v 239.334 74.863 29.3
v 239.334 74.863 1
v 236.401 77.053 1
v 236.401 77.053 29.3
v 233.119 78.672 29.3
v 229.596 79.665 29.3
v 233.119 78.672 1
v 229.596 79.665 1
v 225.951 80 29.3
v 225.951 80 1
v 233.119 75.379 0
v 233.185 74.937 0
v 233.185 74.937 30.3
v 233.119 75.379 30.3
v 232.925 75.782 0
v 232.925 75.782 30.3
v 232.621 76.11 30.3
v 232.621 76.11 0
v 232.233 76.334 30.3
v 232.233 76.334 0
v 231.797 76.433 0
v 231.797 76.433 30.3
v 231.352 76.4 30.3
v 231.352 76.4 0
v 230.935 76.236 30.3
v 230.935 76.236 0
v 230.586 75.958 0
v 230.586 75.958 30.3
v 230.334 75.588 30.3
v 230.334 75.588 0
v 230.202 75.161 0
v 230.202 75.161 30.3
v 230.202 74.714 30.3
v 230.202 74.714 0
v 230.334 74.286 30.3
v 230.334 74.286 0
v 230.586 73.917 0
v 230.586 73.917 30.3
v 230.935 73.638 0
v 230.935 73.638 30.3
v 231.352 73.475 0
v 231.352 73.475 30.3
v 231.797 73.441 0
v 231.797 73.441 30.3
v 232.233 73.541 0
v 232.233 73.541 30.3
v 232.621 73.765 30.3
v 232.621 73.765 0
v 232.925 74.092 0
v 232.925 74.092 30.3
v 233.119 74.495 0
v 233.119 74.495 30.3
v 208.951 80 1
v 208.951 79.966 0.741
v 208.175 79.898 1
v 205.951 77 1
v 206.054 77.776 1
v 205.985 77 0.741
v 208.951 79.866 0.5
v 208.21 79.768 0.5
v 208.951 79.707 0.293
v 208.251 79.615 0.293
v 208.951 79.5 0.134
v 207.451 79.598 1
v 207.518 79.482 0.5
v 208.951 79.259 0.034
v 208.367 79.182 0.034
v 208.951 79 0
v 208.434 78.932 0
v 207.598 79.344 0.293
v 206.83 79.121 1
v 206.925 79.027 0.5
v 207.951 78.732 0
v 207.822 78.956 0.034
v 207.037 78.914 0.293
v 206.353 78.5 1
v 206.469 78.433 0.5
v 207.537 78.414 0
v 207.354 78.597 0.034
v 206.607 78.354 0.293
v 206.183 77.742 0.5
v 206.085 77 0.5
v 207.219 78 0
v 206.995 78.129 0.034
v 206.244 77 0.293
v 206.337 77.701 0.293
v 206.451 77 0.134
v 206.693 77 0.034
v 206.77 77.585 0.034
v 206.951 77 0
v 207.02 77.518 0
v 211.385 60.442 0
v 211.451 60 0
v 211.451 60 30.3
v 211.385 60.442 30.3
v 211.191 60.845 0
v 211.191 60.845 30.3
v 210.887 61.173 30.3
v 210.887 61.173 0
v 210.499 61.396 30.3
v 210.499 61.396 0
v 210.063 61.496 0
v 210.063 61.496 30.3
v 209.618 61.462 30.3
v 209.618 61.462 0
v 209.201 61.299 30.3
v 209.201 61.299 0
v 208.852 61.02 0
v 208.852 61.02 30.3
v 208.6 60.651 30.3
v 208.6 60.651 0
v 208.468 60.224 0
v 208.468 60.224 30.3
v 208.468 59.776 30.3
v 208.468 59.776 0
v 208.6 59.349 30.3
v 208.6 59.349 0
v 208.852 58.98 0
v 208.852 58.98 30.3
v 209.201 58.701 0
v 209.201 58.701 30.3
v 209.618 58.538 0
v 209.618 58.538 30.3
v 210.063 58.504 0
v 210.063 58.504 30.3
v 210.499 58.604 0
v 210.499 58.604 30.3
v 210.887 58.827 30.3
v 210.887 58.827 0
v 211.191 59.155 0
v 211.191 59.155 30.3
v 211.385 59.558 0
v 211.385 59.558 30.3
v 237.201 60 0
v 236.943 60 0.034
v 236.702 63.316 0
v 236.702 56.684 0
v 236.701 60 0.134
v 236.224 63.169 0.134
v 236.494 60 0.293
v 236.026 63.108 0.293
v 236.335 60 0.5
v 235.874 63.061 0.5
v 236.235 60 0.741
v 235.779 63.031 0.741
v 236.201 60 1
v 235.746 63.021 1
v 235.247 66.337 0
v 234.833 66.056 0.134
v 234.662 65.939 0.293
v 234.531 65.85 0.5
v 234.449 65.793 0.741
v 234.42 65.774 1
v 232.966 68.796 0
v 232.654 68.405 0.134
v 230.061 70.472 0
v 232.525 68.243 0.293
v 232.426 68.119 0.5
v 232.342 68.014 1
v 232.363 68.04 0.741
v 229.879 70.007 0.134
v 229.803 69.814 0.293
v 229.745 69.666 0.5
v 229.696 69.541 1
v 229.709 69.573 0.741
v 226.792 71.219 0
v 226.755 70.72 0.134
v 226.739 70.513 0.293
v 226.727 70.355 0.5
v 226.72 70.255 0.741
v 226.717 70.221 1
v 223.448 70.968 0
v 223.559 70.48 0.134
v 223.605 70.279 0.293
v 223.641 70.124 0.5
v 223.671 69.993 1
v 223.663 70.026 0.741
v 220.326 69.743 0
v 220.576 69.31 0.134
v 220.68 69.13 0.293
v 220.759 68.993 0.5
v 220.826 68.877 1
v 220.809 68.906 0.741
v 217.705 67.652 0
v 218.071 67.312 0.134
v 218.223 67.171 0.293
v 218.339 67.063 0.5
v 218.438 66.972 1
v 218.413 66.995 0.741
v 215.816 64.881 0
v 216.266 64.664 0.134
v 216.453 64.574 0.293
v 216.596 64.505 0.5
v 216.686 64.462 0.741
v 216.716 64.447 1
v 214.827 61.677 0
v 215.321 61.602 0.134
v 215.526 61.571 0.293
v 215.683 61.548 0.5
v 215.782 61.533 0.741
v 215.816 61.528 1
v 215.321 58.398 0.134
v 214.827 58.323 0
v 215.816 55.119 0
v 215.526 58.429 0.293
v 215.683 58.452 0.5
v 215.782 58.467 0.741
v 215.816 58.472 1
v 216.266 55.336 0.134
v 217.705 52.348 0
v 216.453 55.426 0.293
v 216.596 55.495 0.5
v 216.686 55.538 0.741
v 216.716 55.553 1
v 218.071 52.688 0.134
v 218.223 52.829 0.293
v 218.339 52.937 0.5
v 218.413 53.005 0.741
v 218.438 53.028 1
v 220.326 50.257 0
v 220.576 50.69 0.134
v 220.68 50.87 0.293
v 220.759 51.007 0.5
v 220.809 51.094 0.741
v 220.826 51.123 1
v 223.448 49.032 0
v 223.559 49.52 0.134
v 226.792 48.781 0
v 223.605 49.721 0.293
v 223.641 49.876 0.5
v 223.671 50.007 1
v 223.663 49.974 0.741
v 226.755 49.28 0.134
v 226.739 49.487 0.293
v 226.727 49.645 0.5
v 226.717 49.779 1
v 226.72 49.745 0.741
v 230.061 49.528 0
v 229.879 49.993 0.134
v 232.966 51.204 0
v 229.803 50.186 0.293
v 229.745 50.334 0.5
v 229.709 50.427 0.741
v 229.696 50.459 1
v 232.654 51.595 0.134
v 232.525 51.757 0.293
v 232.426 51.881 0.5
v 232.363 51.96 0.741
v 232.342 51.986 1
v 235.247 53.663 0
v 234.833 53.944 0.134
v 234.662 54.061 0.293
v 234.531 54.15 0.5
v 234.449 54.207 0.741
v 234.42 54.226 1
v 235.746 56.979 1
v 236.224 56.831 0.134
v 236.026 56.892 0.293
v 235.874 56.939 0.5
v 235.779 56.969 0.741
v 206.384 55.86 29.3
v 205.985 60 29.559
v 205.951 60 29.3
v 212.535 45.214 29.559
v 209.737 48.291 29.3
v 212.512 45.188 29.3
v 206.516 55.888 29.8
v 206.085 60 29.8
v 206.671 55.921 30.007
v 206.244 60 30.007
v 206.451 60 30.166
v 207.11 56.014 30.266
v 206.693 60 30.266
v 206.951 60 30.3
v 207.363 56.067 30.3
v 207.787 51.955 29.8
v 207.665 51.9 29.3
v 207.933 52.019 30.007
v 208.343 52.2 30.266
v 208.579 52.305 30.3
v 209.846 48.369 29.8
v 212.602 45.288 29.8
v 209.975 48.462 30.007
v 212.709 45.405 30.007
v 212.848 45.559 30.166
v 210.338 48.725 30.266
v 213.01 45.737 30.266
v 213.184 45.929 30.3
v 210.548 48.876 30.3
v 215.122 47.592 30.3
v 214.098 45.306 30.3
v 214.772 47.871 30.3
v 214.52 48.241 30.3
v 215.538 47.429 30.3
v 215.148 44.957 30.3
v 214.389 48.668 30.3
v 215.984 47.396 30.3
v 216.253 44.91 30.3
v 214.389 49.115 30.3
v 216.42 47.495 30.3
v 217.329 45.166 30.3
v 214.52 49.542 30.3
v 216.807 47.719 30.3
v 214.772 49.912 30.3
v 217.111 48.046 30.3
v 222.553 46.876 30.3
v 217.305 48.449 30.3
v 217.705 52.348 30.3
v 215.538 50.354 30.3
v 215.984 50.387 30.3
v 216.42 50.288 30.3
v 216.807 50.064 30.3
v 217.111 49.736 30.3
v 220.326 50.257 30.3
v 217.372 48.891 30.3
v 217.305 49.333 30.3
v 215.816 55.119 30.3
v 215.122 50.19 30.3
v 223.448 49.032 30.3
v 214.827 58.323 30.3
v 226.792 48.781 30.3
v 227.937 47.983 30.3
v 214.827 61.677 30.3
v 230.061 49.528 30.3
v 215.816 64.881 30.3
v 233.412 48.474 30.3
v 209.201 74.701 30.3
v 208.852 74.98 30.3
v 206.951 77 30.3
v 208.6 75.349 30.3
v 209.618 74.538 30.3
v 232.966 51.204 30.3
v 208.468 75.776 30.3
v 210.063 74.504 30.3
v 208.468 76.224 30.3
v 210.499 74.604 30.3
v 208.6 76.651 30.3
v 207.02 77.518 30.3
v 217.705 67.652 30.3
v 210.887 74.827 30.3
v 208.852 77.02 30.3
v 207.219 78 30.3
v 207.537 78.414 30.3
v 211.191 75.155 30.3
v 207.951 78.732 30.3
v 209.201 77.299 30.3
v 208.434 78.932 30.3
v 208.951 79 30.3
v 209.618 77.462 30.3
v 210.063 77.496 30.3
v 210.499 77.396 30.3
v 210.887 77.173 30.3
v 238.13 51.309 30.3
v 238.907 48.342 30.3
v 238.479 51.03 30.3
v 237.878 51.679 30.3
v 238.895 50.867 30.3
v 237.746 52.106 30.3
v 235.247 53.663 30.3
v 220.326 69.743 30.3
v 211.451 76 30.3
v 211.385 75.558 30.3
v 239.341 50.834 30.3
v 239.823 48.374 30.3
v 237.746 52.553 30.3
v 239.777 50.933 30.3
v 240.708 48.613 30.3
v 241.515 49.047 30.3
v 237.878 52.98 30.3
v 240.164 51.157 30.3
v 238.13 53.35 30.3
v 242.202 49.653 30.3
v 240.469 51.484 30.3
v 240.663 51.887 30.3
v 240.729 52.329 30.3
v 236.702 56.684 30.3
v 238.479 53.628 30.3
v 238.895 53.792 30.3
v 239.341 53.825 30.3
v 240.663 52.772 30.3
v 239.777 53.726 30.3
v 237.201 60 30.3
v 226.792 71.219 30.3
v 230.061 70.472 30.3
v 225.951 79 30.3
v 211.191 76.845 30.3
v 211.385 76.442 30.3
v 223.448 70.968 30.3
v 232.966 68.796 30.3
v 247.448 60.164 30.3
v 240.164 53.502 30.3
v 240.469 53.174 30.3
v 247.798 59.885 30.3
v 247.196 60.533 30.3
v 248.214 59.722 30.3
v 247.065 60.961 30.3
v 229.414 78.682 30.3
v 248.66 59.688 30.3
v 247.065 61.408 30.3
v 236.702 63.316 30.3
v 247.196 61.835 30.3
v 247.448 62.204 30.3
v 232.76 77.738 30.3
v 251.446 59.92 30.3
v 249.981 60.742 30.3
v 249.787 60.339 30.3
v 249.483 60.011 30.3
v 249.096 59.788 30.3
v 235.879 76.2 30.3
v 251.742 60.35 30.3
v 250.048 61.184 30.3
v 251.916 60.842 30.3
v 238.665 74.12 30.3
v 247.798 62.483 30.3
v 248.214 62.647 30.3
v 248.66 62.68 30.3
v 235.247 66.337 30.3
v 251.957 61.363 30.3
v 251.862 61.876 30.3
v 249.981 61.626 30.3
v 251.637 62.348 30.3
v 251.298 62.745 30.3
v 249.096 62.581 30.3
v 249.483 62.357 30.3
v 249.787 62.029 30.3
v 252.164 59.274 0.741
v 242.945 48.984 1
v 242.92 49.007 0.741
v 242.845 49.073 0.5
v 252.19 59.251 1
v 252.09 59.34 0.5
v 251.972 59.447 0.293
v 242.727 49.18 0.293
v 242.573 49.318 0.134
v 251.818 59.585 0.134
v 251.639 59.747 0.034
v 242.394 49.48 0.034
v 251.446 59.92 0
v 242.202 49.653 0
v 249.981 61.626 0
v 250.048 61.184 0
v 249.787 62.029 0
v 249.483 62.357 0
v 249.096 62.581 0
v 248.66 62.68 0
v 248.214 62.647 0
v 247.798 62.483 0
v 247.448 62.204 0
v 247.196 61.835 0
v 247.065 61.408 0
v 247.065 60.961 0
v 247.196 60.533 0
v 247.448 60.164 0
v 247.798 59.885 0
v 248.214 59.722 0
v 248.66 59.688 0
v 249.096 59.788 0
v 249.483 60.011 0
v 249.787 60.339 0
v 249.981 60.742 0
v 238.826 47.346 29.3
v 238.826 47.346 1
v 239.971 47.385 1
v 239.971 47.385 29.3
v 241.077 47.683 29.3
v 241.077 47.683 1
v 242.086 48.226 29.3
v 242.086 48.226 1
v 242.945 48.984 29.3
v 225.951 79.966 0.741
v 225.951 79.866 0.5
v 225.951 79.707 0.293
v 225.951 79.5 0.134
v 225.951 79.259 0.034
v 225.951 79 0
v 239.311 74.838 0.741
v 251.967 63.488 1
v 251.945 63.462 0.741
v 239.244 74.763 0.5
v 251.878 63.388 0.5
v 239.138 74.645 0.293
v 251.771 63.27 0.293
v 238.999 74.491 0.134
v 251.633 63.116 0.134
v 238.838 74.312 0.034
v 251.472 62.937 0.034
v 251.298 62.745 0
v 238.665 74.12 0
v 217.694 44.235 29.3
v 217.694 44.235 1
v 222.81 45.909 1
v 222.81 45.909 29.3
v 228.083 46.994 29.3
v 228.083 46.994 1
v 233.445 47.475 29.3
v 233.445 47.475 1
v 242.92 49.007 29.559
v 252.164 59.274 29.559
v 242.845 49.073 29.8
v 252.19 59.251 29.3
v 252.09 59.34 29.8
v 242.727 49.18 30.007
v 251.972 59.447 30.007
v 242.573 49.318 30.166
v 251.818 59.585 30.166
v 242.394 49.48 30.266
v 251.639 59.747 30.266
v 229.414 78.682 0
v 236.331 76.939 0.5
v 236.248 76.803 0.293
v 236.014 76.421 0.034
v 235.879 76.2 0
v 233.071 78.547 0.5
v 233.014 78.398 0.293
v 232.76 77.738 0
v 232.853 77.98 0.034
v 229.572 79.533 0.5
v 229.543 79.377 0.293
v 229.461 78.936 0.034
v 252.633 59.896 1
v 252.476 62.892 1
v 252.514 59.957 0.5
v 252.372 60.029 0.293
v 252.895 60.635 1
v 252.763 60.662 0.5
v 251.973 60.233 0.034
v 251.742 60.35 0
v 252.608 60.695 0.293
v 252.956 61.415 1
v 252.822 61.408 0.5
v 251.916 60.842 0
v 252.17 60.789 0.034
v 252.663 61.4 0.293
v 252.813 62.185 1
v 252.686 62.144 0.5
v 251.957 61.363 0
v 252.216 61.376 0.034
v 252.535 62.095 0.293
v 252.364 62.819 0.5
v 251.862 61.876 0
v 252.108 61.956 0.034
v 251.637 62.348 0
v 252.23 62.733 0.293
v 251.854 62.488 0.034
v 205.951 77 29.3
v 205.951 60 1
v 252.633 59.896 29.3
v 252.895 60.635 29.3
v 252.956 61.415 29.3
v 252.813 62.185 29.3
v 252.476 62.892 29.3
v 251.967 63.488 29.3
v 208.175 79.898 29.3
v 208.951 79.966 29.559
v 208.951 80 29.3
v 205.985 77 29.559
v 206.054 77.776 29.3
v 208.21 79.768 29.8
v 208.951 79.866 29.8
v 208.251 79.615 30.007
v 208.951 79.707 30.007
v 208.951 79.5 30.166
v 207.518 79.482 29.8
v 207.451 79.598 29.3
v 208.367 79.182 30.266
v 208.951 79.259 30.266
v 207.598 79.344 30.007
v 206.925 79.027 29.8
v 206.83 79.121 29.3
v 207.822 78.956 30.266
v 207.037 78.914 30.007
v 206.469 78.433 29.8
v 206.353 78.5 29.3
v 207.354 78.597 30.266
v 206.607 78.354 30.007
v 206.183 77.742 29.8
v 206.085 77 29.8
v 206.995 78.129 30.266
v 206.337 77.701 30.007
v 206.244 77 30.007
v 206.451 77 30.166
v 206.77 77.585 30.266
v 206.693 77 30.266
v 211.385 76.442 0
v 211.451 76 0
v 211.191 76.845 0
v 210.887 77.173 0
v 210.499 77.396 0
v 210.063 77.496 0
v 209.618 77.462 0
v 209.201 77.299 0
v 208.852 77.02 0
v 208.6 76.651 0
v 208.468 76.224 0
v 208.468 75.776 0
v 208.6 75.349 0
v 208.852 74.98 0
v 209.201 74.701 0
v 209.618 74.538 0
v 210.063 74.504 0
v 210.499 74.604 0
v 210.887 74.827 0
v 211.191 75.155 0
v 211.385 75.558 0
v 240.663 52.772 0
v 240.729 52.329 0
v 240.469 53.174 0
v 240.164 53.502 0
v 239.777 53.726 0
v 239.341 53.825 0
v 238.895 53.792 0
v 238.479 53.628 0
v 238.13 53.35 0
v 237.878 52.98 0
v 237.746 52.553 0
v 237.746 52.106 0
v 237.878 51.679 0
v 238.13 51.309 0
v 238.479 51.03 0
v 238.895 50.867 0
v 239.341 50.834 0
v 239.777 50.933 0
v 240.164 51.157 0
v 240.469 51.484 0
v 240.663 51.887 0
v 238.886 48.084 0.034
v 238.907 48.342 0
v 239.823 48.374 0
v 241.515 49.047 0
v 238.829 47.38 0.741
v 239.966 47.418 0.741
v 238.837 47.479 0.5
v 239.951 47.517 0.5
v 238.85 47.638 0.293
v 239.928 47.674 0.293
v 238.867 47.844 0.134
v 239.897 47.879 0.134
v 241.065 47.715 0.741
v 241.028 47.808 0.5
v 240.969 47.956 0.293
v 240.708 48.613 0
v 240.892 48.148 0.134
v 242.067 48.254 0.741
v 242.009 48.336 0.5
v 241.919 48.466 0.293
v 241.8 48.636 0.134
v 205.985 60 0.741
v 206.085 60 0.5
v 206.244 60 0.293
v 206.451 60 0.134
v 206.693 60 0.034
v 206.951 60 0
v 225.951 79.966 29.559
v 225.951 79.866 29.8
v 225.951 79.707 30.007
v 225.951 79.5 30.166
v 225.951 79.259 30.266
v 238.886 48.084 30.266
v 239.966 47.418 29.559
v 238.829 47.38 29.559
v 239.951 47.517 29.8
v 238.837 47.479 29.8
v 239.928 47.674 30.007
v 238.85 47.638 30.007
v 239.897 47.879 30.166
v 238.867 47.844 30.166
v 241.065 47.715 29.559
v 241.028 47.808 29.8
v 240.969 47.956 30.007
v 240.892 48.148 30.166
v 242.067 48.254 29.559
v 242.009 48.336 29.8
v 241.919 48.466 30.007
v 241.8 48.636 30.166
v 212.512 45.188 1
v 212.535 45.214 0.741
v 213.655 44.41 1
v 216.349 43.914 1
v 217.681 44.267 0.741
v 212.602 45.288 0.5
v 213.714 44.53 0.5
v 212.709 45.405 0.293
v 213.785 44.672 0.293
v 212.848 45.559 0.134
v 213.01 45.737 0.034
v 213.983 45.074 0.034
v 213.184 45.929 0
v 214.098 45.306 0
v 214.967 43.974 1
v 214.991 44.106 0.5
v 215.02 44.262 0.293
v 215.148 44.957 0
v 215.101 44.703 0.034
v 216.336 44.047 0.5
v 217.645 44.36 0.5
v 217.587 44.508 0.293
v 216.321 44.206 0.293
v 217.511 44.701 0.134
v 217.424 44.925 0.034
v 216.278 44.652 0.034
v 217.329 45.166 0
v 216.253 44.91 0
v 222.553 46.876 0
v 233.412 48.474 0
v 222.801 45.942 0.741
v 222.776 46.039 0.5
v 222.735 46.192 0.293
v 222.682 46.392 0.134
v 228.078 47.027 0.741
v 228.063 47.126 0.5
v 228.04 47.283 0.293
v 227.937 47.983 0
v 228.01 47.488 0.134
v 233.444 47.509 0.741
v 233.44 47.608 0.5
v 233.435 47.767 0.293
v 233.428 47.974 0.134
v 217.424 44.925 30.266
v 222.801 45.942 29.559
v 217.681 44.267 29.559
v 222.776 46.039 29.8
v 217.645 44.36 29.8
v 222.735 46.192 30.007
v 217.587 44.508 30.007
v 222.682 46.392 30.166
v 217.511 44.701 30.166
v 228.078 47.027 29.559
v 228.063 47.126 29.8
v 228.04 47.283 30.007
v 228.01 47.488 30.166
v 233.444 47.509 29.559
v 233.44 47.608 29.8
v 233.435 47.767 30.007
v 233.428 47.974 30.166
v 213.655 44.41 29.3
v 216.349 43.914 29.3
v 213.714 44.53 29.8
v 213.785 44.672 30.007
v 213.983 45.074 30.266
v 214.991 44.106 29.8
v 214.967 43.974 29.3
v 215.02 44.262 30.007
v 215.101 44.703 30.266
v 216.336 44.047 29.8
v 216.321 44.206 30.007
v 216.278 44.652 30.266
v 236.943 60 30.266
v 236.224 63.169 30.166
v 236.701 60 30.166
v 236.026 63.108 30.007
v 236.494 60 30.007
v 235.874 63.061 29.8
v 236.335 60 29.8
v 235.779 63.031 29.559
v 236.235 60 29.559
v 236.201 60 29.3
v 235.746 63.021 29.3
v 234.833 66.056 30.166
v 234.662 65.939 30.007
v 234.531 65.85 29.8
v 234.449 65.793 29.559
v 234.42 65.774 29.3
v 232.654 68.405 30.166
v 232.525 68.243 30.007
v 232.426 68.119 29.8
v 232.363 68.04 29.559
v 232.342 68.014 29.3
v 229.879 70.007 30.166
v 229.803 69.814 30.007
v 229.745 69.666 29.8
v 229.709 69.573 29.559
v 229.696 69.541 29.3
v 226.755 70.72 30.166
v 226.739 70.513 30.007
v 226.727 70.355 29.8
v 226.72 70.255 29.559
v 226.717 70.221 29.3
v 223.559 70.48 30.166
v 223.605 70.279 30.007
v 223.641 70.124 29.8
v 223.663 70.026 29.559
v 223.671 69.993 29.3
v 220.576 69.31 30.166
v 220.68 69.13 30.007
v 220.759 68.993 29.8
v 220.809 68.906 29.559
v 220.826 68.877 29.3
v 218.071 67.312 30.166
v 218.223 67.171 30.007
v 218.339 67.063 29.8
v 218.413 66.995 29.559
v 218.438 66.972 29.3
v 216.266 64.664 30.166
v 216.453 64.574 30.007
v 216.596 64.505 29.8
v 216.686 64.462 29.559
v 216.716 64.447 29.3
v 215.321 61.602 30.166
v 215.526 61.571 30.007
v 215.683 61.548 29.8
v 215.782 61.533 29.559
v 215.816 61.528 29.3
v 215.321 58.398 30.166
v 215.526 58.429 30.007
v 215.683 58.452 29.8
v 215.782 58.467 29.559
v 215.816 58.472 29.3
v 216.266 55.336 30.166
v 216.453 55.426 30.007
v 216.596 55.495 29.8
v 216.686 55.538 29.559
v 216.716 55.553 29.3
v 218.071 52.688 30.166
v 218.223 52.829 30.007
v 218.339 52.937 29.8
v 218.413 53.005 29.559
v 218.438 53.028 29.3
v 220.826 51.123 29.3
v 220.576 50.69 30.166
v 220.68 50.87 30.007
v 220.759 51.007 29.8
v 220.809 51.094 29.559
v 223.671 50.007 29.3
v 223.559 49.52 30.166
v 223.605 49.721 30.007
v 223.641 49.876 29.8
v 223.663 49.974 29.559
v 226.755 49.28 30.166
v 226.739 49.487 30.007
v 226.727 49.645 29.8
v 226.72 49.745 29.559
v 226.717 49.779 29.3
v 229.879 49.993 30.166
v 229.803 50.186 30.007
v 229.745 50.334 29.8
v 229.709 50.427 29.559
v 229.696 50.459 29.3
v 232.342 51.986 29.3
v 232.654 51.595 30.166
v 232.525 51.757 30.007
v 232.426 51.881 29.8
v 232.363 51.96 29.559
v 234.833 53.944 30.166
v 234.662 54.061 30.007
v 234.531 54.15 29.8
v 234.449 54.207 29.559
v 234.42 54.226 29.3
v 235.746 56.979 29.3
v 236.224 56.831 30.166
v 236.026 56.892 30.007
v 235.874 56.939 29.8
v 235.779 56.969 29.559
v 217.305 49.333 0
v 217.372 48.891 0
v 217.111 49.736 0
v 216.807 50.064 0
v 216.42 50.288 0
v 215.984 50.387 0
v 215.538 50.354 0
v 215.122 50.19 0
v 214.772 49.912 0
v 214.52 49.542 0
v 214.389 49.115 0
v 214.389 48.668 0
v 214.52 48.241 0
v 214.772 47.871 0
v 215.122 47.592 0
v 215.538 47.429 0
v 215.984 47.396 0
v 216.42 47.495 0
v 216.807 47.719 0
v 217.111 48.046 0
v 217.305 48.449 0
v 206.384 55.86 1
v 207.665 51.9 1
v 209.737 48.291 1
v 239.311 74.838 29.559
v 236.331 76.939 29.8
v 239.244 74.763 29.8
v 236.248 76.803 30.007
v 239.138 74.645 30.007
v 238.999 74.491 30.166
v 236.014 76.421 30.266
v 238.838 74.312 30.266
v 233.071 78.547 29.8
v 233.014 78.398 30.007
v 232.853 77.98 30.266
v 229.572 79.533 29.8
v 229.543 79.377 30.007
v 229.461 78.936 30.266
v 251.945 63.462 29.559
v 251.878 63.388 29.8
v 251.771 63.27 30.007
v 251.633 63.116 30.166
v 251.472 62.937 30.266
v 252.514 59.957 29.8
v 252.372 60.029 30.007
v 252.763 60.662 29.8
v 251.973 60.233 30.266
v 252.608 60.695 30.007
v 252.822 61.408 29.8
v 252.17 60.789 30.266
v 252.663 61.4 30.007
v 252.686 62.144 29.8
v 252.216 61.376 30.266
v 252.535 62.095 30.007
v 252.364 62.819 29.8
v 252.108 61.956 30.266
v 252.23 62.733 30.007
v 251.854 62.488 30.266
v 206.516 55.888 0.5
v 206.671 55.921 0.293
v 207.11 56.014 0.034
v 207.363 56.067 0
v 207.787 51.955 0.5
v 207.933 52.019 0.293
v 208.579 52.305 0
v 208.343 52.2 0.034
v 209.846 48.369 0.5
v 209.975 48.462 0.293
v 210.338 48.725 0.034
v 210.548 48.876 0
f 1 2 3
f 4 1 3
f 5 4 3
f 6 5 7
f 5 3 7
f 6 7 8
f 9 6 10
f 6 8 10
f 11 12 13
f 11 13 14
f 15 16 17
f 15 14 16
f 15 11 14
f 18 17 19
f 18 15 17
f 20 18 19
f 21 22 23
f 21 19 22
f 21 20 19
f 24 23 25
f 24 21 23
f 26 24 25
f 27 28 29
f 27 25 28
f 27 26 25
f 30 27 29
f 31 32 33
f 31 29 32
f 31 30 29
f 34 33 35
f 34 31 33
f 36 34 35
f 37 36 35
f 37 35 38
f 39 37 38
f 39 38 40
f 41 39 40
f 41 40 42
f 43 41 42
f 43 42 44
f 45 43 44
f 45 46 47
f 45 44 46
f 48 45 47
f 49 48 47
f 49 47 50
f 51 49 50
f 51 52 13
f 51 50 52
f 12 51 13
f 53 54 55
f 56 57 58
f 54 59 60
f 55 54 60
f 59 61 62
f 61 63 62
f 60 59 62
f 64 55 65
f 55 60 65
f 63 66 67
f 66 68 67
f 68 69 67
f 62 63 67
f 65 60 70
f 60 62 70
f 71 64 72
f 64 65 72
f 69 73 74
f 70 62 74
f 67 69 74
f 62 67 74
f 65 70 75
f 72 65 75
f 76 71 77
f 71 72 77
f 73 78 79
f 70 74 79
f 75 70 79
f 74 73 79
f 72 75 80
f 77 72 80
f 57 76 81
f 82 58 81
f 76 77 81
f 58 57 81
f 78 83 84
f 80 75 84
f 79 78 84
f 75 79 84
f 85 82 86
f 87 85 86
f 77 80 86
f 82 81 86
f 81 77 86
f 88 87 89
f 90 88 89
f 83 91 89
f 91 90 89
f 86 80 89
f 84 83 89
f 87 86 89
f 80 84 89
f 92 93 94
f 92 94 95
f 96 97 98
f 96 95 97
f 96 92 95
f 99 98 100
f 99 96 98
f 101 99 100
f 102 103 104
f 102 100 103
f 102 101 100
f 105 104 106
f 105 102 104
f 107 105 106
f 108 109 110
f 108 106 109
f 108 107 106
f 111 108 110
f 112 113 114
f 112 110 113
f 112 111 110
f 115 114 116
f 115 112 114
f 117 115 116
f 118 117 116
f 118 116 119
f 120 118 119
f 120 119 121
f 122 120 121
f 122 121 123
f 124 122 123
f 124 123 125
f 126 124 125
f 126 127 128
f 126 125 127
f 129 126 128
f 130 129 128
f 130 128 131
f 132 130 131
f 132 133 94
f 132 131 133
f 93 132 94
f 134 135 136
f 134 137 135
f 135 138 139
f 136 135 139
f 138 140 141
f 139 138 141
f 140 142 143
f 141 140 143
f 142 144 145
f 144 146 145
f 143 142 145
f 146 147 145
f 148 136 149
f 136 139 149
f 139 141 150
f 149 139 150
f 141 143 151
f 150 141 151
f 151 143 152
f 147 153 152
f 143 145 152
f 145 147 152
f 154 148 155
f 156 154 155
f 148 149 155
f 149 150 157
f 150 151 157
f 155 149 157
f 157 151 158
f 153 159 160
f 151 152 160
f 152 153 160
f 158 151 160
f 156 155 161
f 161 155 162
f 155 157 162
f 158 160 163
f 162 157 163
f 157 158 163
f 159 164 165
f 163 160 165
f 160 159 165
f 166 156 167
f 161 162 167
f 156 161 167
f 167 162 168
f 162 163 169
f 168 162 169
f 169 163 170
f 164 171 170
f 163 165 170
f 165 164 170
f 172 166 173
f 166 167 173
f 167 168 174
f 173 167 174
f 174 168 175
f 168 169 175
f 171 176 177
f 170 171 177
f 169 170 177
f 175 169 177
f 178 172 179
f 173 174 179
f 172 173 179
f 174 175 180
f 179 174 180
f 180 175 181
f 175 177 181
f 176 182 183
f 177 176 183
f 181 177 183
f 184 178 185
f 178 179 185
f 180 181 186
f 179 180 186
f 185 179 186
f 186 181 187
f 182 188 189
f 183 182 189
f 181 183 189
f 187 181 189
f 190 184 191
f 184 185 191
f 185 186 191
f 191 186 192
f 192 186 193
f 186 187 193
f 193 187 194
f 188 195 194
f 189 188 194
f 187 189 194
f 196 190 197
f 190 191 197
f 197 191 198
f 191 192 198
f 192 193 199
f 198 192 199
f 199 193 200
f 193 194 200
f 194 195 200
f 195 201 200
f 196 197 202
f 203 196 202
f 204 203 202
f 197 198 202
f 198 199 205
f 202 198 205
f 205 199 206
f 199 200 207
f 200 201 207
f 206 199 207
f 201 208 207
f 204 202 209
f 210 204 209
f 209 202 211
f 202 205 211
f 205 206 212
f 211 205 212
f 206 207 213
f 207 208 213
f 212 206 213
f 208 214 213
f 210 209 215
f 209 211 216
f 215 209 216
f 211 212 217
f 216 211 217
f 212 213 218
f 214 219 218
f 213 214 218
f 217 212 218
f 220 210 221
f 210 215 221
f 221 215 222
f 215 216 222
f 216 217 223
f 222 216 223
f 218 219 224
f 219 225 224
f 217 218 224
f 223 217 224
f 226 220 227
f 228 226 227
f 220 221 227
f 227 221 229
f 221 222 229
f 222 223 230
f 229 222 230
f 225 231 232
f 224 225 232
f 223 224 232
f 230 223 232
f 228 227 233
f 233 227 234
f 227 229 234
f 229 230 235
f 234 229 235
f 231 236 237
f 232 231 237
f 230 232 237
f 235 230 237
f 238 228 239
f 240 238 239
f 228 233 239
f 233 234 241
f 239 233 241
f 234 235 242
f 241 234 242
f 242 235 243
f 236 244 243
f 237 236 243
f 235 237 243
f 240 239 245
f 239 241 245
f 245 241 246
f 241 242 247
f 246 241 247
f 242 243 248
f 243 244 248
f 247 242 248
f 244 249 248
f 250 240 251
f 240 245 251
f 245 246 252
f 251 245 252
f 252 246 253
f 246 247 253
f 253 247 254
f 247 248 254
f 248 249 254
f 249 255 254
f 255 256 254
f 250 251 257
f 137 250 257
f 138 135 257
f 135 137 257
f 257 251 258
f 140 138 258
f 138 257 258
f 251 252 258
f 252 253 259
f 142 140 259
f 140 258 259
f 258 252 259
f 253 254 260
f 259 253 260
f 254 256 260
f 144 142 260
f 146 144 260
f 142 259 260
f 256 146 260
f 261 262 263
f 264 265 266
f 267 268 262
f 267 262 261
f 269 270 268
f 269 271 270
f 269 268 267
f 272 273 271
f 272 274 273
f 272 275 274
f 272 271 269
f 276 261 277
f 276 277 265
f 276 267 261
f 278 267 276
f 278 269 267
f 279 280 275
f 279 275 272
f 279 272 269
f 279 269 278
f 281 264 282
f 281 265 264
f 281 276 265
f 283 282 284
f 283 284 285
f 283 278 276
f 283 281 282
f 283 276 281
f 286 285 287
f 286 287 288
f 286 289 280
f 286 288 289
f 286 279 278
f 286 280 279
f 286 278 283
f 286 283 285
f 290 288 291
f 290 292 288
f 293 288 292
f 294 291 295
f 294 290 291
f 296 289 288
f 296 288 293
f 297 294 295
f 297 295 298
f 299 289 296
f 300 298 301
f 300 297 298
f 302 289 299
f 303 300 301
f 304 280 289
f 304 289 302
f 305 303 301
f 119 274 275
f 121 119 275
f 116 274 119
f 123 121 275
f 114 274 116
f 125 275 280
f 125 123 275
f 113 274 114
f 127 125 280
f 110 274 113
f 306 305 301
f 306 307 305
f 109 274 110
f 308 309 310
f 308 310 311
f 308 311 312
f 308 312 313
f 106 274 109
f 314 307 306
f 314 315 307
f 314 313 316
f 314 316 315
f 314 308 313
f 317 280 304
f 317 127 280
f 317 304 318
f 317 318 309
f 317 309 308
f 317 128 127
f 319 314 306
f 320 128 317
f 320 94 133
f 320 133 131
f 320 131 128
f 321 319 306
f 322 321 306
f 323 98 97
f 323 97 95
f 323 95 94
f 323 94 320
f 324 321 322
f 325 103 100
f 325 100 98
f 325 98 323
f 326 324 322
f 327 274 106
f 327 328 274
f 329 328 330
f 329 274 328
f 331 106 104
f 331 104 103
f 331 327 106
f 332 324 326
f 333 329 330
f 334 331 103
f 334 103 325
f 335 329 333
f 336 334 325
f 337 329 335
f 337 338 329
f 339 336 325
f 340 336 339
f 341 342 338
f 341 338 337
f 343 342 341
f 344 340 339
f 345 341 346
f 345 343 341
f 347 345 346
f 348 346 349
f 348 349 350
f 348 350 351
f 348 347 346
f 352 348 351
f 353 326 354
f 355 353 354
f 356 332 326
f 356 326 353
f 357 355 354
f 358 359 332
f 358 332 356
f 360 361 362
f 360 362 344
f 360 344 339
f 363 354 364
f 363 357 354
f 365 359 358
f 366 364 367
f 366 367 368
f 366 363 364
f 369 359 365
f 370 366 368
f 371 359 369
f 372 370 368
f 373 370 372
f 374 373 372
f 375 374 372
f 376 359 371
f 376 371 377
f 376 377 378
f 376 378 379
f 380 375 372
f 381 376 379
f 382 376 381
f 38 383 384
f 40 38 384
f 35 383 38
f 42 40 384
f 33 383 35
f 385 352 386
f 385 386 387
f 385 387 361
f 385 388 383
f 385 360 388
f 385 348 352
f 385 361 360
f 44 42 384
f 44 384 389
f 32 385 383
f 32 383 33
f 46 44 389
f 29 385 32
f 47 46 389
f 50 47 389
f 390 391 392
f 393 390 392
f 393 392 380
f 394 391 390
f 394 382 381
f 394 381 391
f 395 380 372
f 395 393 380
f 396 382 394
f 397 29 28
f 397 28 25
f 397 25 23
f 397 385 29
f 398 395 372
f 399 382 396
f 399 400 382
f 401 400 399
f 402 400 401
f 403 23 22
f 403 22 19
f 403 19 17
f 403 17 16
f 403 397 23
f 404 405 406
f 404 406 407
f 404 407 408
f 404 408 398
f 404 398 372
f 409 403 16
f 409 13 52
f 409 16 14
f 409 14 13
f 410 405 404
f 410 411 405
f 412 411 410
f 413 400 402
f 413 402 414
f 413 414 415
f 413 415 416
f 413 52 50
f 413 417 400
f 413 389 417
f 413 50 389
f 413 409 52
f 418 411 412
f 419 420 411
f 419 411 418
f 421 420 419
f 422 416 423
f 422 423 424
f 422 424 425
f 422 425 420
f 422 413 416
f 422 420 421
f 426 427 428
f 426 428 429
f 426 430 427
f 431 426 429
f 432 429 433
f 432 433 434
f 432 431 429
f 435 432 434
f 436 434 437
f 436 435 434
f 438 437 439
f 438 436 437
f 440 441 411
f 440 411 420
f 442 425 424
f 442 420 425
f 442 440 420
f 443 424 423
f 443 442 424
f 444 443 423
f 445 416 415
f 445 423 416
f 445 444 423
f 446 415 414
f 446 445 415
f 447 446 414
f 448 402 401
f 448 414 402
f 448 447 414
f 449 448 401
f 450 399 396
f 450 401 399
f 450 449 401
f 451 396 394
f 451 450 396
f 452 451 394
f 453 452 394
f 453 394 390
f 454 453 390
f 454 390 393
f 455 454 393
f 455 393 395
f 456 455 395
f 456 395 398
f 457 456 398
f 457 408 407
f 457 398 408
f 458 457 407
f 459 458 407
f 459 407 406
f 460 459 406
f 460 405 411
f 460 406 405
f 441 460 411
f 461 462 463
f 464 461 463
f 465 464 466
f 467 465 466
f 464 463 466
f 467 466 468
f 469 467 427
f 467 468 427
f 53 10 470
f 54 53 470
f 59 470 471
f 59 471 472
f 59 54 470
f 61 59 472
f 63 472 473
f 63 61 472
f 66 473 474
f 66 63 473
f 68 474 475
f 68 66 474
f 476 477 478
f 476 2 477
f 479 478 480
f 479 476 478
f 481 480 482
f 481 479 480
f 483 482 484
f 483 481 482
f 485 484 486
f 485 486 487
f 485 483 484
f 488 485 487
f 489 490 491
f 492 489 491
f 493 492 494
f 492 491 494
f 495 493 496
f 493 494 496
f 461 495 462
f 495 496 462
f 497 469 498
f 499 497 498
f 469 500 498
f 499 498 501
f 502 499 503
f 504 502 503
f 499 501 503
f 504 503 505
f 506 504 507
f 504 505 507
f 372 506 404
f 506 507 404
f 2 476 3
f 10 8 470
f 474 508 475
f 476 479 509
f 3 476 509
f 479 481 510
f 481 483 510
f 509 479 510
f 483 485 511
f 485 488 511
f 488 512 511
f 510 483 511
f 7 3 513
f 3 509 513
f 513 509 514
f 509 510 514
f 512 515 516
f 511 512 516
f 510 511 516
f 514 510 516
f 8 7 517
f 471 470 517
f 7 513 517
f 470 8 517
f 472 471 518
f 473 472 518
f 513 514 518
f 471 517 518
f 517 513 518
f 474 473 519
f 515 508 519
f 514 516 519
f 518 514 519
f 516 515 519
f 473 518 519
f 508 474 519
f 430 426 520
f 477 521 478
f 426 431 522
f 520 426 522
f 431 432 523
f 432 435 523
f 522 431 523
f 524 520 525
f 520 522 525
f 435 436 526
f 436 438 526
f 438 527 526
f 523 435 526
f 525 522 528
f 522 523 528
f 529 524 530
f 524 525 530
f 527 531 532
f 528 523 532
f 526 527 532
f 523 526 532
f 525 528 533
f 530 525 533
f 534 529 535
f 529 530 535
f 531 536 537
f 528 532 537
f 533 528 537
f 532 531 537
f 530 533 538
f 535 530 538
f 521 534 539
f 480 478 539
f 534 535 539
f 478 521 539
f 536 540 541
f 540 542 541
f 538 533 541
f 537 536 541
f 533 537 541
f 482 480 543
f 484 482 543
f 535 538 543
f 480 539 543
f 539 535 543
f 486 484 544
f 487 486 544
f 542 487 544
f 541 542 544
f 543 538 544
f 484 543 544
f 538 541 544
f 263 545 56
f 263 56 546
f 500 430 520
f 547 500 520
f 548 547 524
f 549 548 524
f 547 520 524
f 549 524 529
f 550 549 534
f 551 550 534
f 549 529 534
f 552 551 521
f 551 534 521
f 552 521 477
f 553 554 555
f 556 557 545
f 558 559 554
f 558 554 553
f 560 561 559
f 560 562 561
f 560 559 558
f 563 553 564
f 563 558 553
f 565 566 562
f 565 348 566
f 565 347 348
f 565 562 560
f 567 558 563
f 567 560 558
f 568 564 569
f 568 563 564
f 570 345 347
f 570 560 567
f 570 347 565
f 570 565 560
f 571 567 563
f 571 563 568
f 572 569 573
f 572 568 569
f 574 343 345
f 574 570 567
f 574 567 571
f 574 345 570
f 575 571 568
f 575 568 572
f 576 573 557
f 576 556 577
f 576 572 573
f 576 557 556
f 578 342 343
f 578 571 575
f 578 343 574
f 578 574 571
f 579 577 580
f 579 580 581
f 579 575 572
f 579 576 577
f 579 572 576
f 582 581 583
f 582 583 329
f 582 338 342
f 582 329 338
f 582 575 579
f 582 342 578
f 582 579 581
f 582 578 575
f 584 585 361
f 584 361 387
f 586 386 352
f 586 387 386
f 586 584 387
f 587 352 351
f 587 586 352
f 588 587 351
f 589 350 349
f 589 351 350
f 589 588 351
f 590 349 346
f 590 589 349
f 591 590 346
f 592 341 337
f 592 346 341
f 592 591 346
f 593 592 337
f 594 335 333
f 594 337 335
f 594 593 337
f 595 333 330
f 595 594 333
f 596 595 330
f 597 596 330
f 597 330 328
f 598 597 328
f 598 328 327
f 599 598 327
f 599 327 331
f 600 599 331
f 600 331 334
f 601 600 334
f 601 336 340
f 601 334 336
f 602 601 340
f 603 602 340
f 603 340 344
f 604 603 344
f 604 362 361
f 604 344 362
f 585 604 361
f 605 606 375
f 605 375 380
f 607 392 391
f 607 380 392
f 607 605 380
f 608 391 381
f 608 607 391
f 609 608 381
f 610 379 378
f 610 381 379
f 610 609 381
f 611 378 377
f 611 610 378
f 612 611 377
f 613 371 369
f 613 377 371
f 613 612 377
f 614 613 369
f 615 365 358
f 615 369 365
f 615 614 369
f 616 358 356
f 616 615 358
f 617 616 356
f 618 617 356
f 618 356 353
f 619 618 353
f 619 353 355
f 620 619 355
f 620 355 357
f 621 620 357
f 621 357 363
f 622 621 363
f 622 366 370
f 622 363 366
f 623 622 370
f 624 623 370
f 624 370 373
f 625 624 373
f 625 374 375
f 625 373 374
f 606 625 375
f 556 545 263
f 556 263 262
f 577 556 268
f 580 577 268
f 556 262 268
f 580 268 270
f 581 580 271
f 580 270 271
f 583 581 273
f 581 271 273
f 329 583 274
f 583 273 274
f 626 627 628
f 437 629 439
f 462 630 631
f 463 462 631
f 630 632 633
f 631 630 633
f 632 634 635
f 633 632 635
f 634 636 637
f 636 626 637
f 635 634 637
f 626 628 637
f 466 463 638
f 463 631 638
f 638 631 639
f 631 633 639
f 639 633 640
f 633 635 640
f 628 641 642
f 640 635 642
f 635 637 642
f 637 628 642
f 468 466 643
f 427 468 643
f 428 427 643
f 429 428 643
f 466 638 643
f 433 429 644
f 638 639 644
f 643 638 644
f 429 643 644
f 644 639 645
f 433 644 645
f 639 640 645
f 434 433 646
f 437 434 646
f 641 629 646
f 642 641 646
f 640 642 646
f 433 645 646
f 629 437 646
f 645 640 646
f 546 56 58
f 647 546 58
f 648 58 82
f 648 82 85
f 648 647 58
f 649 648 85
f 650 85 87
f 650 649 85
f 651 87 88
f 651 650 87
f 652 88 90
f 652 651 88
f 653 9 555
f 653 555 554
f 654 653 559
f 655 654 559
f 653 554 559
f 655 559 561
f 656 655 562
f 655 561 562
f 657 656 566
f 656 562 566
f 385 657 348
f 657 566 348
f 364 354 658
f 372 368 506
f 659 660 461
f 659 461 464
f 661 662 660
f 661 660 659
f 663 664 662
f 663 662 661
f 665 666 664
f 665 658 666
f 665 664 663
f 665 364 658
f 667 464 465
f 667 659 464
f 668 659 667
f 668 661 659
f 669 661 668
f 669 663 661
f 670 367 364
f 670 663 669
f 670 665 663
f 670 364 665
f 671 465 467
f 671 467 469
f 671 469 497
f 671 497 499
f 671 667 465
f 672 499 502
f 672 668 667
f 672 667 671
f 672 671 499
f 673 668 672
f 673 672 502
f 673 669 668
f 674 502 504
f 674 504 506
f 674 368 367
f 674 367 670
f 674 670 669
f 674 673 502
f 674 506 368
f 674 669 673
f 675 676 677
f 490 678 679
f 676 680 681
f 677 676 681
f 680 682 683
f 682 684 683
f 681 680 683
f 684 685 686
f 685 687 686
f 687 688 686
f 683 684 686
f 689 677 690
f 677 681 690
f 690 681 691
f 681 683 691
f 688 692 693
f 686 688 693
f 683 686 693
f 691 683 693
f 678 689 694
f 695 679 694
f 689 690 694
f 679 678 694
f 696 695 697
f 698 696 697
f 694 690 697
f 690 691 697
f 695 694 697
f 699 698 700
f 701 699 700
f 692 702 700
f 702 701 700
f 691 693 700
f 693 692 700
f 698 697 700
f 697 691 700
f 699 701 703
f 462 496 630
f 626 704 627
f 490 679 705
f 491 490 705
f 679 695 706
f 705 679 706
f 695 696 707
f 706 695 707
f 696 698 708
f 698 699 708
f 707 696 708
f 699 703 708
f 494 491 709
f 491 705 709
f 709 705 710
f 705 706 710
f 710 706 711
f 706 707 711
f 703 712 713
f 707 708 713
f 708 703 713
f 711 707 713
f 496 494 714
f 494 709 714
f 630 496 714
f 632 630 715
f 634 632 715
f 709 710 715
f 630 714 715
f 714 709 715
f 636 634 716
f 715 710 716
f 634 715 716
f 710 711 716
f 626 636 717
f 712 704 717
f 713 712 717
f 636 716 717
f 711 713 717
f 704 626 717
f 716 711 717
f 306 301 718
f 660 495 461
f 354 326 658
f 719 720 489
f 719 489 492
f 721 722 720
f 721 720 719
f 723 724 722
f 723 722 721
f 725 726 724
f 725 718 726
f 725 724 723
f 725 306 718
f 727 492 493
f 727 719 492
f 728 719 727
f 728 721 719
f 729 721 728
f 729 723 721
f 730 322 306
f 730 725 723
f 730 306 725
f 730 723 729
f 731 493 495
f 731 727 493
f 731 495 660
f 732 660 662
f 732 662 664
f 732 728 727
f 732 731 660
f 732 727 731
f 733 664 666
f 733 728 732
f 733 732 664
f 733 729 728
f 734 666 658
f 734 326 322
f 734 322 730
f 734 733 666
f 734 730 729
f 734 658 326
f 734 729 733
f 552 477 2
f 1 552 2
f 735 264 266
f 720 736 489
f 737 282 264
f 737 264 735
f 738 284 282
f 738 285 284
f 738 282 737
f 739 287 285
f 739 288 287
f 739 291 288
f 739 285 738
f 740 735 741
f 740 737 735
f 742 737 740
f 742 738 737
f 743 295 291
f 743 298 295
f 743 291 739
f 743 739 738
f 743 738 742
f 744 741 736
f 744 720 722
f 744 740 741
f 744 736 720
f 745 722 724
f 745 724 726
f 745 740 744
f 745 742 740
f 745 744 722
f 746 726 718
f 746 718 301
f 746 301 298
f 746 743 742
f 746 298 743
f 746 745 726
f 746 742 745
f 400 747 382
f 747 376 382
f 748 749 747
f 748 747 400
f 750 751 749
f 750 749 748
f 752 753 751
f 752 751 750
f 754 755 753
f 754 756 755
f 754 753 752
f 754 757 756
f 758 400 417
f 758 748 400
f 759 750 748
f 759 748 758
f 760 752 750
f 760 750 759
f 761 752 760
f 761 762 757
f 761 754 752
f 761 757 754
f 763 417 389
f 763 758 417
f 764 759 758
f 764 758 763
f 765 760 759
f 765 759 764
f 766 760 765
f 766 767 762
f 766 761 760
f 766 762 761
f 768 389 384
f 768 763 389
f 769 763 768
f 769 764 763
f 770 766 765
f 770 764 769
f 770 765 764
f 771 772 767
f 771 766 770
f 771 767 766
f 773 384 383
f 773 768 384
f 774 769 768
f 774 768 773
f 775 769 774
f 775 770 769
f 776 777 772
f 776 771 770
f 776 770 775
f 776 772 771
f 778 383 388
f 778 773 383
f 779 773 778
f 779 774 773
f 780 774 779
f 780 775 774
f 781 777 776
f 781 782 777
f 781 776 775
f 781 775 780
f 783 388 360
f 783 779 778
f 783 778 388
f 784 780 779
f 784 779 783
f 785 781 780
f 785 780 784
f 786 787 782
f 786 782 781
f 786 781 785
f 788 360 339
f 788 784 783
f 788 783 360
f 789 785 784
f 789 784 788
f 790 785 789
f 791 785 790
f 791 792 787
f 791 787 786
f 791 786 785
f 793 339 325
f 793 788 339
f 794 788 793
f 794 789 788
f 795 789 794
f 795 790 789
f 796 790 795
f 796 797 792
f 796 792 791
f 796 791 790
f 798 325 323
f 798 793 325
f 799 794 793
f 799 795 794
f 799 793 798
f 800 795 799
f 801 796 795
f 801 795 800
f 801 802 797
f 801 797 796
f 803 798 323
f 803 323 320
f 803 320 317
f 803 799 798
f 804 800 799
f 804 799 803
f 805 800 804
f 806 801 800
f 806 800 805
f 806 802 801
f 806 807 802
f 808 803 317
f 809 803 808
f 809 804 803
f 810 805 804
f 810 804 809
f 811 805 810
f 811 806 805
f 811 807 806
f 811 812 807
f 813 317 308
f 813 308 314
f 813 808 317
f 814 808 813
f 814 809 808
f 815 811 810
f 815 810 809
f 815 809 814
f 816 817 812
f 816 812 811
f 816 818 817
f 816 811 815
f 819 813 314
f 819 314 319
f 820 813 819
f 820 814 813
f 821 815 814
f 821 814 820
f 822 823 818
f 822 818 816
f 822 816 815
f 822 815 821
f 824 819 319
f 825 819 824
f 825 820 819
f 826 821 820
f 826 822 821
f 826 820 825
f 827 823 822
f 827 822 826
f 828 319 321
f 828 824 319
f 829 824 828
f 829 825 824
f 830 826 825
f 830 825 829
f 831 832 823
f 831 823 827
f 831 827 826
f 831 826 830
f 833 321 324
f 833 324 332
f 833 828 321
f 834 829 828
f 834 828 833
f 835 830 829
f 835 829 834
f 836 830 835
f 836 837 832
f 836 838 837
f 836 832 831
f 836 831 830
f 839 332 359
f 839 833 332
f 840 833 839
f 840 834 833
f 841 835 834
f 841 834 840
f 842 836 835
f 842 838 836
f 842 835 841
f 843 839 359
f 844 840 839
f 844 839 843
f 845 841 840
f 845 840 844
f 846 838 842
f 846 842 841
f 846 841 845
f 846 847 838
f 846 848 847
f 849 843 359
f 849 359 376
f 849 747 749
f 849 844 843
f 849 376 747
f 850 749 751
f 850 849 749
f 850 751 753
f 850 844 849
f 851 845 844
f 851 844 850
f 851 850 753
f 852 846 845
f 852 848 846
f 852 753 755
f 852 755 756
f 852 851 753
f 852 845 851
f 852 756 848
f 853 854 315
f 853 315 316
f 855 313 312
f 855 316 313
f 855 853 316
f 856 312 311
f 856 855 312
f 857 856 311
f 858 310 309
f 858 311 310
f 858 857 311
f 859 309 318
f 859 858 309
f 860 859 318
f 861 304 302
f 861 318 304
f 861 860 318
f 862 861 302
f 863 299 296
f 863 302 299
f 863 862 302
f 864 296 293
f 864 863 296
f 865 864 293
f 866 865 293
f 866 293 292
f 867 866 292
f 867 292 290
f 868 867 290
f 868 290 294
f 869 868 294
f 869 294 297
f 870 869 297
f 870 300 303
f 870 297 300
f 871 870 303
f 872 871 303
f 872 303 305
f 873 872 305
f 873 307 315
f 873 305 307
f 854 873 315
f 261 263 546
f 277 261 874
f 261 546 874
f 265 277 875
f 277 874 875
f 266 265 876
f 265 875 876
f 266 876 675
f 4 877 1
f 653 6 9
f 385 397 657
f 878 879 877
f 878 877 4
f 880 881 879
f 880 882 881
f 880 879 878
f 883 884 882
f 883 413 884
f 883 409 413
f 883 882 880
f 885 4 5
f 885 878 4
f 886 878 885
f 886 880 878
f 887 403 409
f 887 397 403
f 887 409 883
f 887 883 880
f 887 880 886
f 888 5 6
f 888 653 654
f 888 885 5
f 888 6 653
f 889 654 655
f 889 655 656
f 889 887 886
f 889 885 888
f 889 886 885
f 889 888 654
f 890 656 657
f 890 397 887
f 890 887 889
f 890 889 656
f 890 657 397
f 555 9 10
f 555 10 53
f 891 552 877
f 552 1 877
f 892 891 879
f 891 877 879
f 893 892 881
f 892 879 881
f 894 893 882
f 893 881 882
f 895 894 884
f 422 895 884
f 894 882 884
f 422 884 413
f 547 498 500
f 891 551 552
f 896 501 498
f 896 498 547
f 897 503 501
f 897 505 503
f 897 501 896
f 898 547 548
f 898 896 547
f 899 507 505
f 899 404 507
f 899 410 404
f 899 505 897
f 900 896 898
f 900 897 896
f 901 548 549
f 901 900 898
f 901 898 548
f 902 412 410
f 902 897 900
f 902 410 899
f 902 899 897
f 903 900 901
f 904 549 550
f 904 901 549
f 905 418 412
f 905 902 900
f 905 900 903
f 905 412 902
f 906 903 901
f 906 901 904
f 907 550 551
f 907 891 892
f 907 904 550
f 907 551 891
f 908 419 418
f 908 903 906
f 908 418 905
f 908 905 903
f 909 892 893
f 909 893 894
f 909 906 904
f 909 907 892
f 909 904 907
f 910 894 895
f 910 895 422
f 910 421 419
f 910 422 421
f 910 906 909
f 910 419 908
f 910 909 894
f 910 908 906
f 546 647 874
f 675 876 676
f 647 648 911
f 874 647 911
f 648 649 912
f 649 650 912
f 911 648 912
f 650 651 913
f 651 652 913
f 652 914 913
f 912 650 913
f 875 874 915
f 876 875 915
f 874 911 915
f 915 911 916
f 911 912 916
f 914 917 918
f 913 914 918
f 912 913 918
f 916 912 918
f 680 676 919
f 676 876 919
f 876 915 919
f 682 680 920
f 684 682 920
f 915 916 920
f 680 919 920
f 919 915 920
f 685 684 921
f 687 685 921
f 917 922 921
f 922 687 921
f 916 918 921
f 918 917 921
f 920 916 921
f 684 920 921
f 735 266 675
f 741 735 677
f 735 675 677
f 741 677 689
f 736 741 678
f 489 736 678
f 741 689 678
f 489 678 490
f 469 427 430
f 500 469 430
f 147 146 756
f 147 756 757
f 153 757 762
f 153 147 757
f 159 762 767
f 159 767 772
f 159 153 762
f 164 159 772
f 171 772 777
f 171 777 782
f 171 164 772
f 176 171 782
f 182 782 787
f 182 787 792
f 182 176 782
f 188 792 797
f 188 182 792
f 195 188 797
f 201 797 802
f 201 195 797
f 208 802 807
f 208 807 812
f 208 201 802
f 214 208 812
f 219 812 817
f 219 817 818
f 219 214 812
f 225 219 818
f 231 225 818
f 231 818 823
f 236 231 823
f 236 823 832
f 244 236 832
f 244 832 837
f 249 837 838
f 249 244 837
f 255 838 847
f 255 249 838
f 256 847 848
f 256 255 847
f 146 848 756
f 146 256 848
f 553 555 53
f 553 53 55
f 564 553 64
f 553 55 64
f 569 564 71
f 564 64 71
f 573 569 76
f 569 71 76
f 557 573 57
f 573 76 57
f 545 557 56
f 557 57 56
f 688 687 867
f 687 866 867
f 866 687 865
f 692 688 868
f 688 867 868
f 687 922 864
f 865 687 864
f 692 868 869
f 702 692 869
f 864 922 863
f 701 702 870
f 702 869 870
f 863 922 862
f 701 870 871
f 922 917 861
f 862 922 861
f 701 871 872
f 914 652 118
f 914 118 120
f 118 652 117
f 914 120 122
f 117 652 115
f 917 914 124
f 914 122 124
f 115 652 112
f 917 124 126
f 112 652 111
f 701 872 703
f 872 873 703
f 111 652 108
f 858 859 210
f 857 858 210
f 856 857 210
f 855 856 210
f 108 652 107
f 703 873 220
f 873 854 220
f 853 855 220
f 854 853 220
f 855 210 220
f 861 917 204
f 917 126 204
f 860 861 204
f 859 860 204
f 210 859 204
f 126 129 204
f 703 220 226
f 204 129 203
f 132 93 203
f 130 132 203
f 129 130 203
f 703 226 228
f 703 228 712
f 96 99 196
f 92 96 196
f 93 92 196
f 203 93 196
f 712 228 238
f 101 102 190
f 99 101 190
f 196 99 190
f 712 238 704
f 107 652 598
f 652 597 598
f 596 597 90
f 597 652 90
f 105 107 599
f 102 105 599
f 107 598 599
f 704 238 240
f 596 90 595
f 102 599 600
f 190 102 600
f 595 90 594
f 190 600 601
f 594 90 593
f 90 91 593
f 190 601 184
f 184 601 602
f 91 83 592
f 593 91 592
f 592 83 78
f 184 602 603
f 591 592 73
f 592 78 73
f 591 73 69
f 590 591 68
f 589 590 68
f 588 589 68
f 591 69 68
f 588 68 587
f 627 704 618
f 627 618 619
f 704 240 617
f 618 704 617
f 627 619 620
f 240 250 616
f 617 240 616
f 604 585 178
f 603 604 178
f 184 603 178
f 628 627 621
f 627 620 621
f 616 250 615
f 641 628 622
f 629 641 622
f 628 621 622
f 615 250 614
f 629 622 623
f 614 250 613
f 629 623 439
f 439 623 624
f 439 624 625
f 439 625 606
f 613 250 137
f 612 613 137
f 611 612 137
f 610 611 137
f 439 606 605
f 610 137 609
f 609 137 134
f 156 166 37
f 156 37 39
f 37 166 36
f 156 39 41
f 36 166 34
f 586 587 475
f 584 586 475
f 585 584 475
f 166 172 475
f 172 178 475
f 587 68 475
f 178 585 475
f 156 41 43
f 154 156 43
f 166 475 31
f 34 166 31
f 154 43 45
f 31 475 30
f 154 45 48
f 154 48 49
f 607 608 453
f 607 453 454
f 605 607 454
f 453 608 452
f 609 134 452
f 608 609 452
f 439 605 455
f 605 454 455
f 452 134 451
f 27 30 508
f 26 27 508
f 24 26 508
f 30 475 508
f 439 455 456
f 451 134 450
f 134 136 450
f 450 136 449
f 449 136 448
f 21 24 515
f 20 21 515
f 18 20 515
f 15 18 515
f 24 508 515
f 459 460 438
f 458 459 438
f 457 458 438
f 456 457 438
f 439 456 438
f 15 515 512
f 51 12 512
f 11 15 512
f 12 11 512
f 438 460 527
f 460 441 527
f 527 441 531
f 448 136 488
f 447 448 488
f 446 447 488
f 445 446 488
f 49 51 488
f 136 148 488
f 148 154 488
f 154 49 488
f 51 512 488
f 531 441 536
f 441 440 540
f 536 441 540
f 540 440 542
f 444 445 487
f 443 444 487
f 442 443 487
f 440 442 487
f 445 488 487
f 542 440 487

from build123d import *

# Parameters (mm, degrees)
SKETCH_1_R               = 10.25
EXTRUDE_1_DEPTH          = 30.3
CUT_EXTRUDE_1_DEPTH      = 268.033508634
CUT_EXTRUDE_1_DEPTH_BACK = 268.033508634
SKETCH_2_R               = 1.5
FILLET_1_R               = 1


with BuildPart() as part:
    # 草图1 → 凸台-拉伸1 (new body)
    with BuildSketch(Plane.XY):
        with BuildLine():
            Line((205.951402916, 77), (205.951402916, 60))
            ThreePointArc((205.951402916, 60), (207.664953018, 51.900262342), (212.511977929, 45.188455313))
            ThreePointArc((212.511977929, 45.188455313), (214.967004798, 43.973894607), (217.693564254, 44.235023248))
            ThreePointArc((217.693564254, 44.235023248), (228.082885446, 46.993654106), (238.826448864, 47.345625871))
            ThreePointArc((238.826448864, 47.345625871), (241.077132686, 47.68338128), (242.944957082, 48.983722931))
            Line((242.944957082, 48.983722931), (252.189519734, 59.250849906))
            ThreePointArc((252.189519734, 59.250849906), (252.955973862, 61.415249594), (251.967477077, 63.487676201))
            Line((251.967477077, 63.487676201), (239.334015044, 74.86289651))
            ThreePointArc((239.334015044, 74.86289651), (233.118761907, 78.67160853), (225.951402916, 80))
            Line((225.951402916, 80), (208.951402916, 80))
            ThreePointArc((208.951402916, 80), (206.830082573, 79.121320344), (205.951402916, 77))
        make_face()
        with Locations((225.951402916, 60)):
            Circle(SKETCH_1_R, mode=Mode.SUBTRACT)
    extrude(amount=EXTRUDE_1_DEPTH)

    # 草图2 → 切除-拉伸1 (cut, two sides: drawn at the far end of the back side and taken through both)
    with BuildSketch(Plane.XY.offset(30.3).offset(-CUT_EXTRUDE_1_DEPTH_BACK)):
        with Locations((215.871834176, 48.891341485)):
            Circle(SKETCH_2_R)
        with Locations((209.951402916, 60)):
            Circle(SKETCH_2_R)
        with Locations((209.951402916, 76)):
            Circle(SKETCH_2_R)
        with Locations((231.685290109, 74.937286824)):
            Circle(SKETCH_2_R)
        with Locations((239.229232955, 52.329375962)):
            Circle(SKETCH_2_R)
        with Locations((248.547809826, 61.184227506)):
            Circle(SKETCH_2_R)
    extrude(amount=CUT_EXTRUDE_1_DEPTH + CUT_EXTRUDE_1_DEPTH_BACK, mode=Mode.SUBTRACT)

    # 圆角1
    fillet_1_edges = [part.edges().sort_by_distance(p)[0] for p in [
        (205.951402916, 68.5, 0),
        (205.951402916, 68.5, 30.3),
        (206.830082573, 79.121320344, 0),
        (206.830082573, 79.121320344, 30.3),
        (207.664953018, 51.900262342, 0),
        (207.664953018, 51.900262342, 30.3),
        (217.451402916, 80, 0),
        (214.967004798, 43.973894607, 0),
        (233.118761907, 78.67160853, 0),
        (228.082885446, 46.993654106, 0),
        (245.65074606, 69.175286355, 0),
        (241.077132686, 47.68338128, 0),
        (252.955973862, 61.415249594, 0),
        (247.567238408, 54.117286418, 0),
        (215.701402916, 60, 0),
        (217.451402916, 80, 30.3),
        (214.967004798, 43.973894607, 30.3),
        (233.118761907, 78.67160853, 30.3),
        (228.082885446, 46.993654106, 30.3),
        (245.65074606, 69.175286355, 30.3),
        (241.077132686, 47.68338128, 30.3),
        (252.955973862, 61.415249594, 30.3),
        (247.567238408, 54.117286418, 30.3),
        (215.701402916, 60, 30.3),
    ]]
    fillet(fillet_1_edges, radius=FILLET_1_R)


solid = part.part
